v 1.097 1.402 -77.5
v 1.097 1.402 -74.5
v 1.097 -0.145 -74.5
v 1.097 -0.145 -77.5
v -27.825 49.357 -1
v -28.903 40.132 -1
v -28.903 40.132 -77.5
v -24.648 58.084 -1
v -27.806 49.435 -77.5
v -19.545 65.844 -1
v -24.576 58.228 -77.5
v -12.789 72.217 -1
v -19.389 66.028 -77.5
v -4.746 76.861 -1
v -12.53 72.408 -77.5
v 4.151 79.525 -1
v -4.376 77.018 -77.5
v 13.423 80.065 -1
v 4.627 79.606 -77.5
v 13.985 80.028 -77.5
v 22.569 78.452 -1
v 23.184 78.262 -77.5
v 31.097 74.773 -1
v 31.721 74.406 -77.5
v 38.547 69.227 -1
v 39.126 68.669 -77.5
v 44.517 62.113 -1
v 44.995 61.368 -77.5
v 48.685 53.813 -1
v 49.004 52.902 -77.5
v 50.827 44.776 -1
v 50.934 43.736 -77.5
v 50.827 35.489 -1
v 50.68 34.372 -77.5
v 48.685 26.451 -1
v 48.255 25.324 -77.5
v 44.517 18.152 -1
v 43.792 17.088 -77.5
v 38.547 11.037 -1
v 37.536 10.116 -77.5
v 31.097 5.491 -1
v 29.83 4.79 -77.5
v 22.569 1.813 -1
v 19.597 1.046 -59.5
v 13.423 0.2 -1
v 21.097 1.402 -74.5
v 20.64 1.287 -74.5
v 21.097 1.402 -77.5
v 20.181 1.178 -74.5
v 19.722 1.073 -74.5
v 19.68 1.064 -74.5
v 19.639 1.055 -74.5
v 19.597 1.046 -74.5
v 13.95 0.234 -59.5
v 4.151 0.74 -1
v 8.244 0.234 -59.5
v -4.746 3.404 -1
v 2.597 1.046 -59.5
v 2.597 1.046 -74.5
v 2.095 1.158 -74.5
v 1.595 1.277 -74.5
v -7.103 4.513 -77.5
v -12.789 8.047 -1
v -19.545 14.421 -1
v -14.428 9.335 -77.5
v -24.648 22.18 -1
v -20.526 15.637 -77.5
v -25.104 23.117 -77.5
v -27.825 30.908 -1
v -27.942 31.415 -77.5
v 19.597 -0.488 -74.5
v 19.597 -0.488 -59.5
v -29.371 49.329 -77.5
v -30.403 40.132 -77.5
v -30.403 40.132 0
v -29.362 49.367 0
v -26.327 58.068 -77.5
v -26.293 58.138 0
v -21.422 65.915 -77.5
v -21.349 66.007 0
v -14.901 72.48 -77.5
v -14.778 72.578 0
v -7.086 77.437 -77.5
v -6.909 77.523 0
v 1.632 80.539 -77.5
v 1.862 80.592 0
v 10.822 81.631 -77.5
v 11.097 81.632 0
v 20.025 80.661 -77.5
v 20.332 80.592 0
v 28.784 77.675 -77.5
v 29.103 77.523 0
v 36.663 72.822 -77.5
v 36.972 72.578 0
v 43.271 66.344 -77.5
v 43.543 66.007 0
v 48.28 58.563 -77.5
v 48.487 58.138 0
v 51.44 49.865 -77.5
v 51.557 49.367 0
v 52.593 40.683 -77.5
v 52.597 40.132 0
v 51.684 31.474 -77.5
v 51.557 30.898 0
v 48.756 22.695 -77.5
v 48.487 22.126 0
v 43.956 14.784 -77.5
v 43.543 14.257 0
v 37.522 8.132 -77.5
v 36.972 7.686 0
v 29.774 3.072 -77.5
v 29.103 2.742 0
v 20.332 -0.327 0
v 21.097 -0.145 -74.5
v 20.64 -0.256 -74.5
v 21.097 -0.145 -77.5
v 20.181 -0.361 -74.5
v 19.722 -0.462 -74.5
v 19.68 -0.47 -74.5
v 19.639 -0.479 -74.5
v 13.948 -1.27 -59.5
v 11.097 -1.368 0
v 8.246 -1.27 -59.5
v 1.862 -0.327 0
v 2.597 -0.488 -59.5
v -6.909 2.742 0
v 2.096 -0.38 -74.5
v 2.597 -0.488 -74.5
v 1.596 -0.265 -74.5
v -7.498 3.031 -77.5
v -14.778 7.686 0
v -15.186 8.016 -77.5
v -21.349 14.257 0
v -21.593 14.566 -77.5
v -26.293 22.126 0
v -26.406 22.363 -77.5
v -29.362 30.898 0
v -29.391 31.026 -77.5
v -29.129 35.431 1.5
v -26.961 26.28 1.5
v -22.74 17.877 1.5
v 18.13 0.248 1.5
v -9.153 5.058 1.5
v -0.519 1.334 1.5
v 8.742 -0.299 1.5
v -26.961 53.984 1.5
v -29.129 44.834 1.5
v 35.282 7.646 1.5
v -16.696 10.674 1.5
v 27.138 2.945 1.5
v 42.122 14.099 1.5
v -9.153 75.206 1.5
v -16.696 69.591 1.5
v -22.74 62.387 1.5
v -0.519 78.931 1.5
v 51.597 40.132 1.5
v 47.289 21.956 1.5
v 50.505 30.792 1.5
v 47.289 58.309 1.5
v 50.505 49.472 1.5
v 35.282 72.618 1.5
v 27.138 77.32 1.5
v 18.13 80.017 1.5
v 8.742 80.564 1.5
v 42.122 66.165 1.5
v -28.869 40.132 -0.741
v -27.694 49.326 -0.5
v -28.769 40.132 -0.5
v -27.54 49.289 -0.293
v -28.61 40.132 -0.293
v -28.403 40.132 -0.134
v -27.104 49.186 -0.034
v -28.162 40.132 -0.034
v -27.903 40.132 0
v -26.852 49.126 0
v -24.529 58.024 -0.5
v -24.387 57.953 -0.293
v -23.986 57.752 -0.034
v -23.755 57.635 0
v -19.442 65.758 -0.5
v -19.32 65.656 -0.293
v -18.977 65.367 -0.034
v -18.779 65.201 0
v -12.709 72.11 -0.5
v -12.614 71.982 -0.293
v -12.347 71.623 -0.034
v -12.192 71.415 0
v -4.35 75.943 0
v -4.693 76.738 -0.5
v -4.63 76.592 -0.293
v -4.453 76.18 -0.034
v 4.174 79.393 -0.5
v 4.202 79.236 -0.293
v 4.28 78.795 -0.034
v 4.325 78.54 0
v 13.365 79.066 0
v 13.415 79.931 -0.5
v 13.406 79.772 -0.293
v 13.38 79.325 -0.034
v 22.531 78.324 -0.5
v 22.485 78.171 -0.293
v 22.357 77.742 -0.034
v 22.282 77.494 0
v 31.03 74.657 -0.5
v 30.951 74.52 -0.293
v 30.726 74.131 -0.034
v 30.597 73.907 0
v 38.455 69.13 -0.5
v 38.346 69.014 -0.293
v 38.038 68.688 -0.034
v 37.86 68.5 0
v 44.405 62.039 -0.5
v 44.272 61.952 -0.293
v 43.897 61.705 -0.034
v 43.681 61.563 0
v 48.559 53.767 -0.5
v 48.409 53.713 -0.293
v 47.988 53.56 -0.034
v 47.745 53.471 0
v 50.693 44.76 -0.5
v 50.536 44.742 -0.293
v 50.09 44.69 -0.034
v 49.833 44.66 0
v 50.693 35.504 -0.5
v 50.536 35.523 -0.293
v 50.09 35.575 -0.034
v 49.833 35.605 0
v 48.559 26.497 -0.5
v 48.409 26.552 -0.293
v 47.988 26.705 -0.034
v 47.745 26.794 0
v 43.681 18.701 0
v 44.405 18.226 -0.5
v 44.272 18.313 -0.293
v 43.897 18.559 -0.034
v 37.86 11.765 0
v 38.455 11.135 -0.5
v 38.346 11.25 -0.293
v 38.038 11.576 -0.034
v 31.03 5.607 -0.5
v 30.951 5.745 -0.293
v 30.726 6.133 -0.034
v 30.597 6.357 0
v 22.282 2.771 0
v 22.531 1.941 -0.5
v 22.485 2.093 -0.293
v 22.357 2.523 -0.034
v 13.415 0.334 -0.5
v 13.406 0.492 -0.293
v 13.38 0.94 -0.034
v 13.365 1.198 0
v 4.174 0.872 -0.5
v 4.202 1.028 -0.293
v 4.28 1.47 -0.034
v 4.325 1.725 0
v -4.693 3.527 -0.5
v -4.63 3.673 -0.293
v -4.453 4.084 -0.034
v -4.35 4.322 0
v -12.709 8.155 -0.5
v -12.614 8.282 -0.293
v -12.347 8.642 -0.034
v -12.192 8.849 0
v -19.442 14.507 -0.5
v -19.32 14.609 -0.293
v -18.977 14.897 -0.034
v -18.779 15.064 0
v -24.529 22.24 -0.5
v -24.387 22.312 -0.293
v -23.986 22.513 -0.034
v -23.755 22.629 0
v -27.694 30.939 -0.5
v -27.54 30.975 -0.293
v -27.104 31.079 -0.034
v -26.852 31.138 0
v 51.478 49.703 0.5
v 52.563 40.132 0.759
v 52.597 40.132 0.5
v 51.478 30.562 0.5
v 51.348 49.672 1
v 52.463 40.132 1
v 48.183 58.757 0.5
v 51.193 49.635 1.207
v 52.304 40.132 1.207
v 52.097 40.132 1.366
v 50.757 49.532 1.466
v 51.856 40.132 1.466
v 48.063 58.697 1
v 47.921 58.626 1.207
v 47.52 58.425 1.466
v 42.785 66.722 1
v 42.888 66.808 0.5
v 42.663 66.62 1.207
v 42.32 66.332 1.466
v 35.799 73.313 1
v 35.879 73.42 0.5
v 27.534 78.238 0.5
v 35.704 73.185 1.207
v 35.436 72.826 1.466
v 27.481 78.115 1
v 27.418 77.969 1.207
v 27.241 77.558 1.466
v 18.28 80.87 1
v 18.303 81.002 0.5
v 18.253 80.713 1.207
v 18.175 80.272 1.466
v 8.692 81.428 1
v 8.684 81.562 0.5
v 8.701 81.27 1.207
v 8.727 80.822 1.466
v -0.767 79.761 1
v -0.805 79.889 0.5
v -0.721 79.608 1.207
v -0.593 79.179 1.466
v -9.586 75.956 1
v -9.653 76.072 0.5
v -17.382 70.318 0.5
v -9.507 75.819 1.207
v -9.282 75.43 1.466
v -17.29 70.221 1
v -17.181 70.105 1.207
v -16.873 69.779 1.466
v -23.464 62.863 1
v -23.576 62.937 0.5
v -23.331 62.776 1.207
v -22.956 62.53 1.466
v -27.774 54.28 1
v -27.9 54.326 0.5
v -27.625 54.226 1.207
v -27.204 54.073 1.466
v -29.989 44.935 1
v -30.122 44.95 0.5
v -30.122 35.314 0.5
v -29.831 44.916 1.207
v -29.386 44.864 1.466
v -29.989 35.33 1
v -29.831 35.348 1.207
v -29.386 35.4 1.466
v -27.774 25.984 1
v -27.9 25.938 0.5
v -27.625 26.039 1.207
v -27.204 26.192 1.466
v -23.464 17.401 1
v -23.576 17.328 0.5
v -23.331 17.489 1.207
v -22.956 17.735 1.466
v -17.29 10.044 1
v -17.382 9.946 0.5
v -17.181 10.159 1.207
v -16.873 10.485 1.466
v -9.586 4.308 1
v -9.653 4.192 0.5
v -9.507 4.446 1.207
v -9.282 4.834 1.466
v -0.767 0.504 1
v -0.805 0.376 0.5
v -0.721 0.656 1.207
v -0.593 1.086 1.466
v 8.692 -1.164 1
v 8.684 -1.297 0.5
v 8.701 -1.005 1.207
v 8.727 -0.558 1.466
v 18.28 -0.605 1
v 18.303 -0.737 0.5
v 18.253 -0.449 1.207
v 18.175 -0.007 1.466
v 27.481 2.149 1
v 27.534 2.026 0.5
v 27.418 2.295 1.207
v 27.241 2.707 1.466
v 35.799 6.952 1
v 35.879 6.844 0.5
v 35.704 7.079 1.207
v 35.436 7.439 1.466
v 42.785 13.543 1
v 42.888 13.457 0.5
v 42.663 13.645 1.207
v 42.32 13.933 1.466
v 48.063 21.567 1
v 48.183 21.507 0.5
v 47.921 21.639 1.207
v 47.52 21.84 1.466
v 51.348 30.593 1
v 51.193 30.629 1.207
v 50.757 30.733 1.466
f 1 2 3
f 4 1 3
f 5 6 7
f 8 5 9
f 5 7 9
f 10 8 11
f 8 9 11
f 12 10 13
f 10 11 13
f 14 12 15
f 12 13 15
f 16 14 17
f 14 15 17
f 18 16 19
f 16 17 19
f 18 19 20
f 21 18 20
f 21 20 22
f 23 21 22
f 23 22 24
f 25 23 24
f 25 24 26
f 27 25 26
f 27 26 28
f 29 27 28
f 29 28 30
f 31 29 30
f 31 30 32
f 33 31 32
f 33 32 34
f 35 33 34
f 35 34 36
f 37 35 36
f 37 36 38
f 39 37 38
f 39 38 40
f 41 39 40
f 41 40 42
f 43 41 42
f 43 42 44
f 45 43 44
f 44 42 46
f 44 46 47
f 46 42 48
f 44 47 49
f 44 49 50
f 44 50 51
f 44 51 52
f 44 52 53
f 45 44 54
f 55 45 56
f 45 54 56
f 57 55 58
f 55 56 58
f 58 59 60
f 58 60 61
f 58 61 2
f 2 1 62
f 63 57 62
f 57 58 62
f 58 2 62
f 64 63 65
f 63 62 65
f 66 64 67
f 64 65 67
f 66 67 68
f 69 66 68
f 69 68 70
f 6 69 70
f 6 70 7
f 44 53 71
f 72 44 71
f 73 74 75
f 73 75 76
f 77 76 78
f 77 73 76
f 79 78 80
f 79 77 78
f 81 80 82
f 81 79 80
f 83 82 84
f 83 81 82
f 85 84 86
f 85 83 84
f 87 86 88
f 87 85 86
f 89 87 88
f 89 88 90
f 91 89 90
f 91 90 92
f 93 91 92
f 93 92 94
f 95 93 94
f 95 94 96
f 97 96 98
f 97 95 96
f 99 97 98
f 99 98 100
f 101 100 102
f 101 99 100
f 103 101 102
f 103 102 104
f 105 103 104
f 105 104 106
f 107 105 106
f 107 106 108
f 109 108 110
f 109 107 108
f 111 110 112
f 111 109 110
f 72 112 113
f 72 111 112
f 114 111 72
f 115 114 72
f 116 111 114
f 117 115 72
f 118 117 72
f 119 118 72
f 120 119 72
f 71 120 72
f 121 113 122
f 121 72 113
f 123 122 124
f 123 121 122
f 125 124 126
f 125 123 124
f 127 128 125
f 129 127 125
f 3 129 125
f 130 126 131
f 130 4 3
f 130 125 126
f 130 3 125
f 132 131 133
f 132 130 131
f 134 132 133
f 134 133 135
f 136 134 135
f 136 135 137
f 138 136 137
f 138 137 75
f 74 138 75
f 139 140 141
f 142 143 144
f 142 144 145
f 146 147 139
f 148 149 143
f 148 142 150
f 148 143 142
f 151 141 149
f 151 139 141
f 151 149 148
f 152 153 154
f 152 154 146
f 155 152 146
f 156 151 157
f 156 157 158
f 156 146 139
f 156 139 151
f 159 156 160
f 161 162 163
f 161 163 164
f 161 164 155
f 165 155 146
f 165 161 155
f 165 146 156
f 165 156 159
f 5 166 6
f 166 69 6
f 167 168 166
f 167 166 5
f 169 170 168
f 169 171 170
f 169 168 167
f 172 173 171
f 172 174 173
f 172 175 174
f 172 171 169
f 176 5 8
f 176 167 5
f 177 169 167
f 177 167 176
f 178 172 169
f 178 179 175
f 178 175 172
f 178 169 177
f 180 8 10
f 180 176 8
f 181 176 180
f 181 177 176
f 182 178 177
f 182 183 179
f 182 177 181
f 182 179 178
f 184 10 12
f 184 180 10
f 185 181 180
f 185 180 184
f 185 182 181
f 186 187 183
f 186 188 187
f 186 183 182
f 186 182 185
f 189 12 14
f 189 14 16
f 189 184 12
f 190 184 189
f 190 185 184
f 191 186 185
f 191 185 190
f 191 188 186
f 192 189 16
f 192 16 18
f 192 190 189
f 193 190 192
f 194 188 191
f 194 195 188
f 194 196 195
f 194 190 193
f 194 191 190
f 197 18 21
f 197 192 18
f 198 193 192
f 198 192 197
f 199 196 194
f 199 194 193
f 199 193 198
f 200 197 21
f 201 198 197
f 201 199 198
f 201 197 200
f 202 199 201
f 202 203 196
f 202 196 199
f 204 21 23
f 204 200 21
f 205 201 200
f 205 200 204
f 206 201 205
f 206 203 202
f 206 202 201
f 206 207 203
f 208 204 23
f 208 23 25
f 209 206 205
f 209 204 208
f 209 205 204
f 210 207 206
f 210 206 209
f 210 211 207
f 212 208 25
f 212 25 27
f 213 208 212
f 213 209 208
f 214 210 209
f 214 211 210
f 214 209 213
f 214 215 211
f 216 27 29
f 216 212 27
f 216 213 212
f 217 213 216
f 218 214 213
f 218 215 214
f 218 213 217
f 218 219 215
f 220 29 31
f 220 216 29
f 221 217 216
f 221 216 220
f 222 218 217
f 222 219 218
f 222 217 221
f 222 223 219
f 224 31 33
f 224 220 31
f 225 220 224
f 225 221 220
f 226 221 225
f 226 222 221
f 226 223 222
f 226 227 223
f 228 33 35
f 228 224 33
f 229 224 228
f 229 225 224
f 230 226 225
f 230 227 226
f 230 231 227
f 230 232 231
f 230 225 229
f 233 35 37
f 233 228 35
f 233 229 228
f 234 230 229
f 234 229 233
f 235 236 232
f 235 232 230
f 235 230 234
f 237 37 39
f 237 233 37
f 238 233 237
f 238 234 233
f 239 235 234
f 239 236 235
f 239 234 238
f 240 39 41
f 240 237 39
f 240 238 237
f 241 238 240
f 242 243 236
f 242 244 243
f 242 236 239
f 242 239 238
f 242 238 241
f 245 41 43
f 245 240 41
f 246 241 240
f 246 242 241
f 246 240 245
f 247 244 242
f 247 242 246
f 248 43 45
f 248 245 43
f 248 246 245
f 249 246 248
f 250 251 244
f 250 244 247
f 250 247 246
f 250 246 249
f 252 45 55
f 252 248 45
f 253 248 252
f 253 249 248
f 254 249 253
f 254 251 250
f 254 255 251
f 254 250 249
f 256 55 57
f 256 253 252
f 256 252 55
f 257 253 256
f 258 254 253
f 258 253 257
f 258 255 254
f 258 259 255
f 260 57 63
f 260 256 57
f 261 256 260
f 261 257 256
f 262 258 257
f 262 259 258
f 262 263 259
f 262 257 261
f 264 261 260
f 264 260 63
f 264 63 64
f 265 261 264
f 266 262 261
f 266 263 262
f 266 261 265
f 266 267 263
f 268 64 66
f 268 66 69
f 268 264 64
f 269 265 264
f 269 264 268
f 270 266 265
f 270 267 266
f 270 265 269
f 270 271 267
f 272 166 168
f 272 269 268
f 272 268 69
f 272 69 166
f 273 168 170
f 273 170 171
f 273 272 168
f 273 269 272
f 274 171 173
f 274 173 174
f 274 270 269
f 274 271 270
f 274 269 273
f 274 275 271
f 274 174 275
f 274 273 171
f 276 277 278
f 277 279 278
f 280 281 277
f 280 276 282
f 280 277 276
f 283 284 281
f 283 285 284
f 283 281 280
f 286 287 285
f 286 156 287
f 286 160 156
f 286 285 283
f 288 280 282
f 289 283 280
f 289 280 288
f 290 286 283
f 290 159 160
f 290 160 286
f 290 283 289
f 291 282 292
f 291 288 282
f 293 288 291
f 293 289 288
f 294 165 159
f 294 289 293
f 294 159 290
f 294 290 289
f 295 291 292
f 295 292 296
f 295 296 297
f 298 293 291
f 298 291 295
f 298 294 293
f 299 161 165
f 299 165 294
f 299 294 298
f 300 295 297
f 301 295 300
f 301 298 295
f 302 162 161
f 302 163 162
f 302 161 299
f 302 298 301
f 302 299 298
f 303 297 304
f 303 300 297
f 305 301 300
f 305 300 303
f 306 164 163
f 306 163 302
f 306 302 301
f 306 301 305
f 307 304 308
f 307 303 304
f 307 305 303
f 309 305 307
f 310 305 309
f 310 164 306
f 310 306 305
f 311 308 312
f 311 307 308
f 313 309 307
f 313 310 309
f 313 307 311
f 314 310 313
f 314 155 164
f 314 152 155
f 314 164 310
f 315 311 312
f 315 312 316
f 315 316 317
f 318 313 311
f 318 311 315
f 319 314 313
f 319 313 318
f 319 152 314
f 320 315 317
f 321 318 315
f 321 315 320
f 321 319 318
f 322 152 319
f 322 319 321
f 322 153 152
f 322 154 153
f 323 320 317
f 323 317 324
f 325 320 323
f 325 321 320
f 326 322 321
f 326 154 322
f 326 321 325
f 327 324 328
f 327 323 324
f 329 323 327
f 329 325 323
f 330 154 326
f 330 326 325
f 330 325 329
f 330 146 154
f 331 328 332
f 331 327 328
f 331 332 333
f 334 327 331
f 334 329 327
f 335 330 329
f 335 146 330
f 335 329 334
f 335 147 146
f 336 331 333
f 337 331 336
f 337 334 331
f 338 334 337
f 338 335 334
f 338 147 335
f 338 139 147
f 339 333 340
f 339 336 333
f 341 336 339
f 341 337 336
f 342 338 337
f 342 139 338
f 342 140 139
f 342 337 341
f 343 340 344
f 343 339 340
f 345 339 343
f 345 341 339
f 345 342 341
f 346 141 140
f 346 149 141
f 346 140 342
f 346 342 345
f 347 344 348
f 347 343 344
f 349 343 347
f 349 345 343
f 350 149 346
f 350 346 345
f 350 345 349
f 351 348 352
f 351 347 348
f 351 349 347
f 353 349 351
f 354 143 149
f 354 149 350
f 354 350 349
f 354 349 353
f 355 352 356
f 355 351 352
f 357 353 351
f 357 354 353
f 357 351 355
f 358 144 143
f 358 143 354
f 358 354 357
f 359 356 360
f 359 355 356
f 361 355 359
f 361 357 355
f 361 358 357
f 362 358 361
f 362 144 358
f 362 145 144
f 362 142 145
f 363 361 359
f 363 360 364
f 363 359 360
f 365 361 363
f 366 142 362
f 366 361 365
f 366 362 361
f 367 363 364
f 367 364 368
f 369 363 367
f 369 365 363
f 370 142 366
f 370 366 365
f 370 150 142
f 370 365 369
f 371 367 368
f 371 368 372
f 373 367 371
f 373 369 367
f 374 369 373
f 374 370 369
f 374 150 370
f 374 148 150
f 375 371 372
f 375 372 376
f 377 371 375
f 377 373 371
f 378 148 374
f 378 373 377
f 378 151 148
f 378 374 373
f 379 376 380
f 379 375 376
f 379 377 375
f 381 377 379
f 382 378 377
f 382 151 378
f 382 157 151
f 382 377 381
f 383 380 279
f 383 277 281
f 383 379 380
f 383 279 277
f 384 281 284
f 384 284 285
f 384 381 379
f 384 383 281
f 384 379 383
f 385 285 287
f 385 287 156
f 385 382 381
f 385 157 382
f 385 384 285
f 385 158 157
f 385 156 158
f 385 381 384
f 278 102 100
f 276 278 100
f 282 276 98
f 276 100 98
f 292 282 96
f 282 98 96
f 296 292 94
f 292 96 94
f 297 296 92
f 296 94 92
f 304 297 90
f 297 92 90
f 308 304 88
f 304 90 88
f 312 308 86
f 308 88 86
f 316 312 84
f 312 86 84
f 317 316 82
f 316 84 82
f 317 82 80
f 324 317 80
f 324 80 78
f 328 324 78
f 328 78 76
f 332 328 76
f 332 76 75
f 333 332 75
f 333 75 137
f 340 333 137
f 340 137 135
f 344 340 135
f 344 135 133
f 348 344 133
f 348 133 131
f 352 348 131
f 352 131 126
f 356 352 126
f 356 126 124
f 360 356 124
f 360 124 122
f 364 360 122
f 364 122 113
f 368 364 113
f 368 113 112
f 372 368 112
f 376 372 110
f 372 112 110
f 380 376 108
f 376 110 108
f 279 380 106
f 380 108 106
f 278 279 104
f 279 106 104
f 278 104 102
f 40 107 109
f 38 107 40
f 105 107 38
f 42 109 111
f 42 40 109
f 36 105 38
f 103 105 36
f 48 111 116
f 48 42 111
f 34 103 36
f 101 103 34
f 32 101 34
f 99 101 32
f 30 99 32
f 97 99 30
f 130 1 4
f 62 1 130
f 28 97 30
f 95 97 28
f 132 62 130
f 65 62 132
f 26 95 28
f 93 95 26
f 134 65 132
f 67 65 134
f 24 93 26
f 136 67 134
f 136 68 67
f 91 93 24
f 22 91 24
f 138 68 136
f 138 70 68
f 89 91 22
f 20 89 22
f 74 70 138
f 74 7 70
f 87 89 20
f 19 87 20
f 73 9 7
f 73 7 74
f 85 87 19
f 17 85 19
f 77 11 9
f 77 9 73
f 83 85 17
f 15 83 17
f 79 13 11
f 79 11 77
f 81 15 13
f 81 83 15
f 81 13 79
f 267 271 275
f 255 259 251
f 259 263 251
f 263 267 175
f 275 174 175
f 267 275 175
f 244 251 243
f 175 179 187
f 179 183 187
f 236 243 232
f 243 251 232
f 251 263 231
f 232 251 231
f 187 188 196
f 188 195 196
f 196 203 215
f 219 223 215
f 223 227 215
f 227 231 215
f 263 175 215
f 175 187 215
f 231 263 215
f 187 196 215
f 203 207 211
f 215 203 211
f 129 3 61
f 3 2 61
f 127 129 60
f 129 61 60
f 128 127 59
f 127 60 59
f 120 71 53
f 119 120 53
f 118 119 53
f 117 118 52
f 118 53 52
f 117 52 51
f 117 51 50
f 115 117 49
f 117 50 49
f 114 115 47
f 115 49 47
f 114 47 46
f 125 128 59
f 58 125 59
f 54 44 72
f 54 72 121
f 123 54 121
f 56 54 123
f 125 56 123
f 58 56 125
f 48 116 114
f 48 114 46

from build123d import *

# Parameters (mm, degrees)
ESQUISSE1_R             = 41.5
BOSS_EXTRU_1_DEPTH      = 1.5
BOSS_EXTRU_2_START      = 77.5
ESQUISSE2_R             = 41.5
ESQUISSE2_R_2           = 40
BOSS_EXTRU_2_DEPTH      = 77.5
ENL_V_MAT_EXTRU_2_DEPTH = 3
ENL_V_MAT_EXTRU_3_DEPTH = 15
FILLET1_R               = 1


with BuildPart() as part:
    # Esquisse1 → Boss.-Extru.1 (new body)
    with BuildSketch(Plane.XY):
        with Locations((11.097015348, 40.132293596)):
            Circle(ESQUISSE1_R)
    extrude(amount=BOSS_EXTRU_1_DEPTH)

    # Esquisse2 → Boss.-Extru.2 (add)
    with BuildSketch(Plane(origin=(0, 0, 0), x_dir=(-1, 0, 0), z_dir=(0, 0, -1)).offset(BOSS_EXTRU_2_START)):
        with Locations((-11.097015348, 40.132293596)):
            Circle(ESQUISSE2_R)
        with Locations((-11.097015348, 40.132293596)):
            Circle(ESQUISSE2_R_2, mode=Mode.SUBTRACT)
    extrude(amount=-BOSS_EXTRU_2_DEPTH)

    # Esquisse4 → Enlèv. mat.-Extru.2 (cut)
    with BuildSketch(Plane(origin=(0, 0, -77.5), x_dir=(-1, 0, 0), z_dir=(0, 0, -1))):
        with BuildLine():
            Line((-21.096949989, -0.144887377), (-21.096949989, 1.402443259))
            ThreePointArc((-21.096949989, 1.402443259), (-20.410817154, 1.231739668), (-19.721774233, 1.073190507))
            ThreePointArc((-19.721774233, 1.073190507), (-11.224690221, 0.132497358), (-2.721774233, 1.018928409))
            ThreePointArc((-2.721774233, 1.018928409), (-1.907360872, 1.202224875), (-1.096949989, 1.40247701))
            Line((-1.096949989, 1.40247701), (-1.096949989, -0.144854923))
            ThreePointArc((-1.096949989, -0.144854923), (-1.907510299, -0.337485214), (-2.721774233, -0.513805064))
            ThreePointArc((-2.721774233, -0.513805064), (-11.224476459, -1.367510664), (-19.721774233, -0.461591832))
            ThreePointArc((-19.721774233, -0.461591832), (-20.410708368, -0.309085242), (-21.096949989, -0.144887377))
        make_face()
    extrude(amount=-ENL_V_MAT_EXTRU_2_DEPTH, mode=Mode.SUBTRACT)

    # Esquisse5 → Enlèv. mat.-Extru.3 (cut)
    with BuildSketch(Plane(origin=(0, 0, -74.5), x_dir=(-1, 0, 0), z_dir=(0, 0, -1))):
        with BuildLine():
            Line((-19.597015348, 1.045850934), (-19.597015348, -0.487898427))
            ThreePointArc((-19.597015348, -0.487898427), (-11.097015348, -1.367706404), (-2.597015348, -0.487898427))
            Line((-2.597015348, -0.487898427), (-2.597015348, 1.045850934))
            ThreePointArc((-2.597015348, 1.045850934), (-11.097015348, 0.132293596), (-19.597015348, 1.045850934))
        make_face()
    extrude(amount=-ENL_V_MAT_EXTRU_3_DEPTH, mode=Mode.SUBTRACT)

    # Fillet1
    fillet1_edges = [part.edges().sort_by_distance(p)[0] for p in [
        (-30.402984652, 40.132293596, 1.5),
        (51.097015348, 40.132293596, 0),
    ]]
    fillet(fillet1_edges, radius=FILLET1_R)


solid = part.part
